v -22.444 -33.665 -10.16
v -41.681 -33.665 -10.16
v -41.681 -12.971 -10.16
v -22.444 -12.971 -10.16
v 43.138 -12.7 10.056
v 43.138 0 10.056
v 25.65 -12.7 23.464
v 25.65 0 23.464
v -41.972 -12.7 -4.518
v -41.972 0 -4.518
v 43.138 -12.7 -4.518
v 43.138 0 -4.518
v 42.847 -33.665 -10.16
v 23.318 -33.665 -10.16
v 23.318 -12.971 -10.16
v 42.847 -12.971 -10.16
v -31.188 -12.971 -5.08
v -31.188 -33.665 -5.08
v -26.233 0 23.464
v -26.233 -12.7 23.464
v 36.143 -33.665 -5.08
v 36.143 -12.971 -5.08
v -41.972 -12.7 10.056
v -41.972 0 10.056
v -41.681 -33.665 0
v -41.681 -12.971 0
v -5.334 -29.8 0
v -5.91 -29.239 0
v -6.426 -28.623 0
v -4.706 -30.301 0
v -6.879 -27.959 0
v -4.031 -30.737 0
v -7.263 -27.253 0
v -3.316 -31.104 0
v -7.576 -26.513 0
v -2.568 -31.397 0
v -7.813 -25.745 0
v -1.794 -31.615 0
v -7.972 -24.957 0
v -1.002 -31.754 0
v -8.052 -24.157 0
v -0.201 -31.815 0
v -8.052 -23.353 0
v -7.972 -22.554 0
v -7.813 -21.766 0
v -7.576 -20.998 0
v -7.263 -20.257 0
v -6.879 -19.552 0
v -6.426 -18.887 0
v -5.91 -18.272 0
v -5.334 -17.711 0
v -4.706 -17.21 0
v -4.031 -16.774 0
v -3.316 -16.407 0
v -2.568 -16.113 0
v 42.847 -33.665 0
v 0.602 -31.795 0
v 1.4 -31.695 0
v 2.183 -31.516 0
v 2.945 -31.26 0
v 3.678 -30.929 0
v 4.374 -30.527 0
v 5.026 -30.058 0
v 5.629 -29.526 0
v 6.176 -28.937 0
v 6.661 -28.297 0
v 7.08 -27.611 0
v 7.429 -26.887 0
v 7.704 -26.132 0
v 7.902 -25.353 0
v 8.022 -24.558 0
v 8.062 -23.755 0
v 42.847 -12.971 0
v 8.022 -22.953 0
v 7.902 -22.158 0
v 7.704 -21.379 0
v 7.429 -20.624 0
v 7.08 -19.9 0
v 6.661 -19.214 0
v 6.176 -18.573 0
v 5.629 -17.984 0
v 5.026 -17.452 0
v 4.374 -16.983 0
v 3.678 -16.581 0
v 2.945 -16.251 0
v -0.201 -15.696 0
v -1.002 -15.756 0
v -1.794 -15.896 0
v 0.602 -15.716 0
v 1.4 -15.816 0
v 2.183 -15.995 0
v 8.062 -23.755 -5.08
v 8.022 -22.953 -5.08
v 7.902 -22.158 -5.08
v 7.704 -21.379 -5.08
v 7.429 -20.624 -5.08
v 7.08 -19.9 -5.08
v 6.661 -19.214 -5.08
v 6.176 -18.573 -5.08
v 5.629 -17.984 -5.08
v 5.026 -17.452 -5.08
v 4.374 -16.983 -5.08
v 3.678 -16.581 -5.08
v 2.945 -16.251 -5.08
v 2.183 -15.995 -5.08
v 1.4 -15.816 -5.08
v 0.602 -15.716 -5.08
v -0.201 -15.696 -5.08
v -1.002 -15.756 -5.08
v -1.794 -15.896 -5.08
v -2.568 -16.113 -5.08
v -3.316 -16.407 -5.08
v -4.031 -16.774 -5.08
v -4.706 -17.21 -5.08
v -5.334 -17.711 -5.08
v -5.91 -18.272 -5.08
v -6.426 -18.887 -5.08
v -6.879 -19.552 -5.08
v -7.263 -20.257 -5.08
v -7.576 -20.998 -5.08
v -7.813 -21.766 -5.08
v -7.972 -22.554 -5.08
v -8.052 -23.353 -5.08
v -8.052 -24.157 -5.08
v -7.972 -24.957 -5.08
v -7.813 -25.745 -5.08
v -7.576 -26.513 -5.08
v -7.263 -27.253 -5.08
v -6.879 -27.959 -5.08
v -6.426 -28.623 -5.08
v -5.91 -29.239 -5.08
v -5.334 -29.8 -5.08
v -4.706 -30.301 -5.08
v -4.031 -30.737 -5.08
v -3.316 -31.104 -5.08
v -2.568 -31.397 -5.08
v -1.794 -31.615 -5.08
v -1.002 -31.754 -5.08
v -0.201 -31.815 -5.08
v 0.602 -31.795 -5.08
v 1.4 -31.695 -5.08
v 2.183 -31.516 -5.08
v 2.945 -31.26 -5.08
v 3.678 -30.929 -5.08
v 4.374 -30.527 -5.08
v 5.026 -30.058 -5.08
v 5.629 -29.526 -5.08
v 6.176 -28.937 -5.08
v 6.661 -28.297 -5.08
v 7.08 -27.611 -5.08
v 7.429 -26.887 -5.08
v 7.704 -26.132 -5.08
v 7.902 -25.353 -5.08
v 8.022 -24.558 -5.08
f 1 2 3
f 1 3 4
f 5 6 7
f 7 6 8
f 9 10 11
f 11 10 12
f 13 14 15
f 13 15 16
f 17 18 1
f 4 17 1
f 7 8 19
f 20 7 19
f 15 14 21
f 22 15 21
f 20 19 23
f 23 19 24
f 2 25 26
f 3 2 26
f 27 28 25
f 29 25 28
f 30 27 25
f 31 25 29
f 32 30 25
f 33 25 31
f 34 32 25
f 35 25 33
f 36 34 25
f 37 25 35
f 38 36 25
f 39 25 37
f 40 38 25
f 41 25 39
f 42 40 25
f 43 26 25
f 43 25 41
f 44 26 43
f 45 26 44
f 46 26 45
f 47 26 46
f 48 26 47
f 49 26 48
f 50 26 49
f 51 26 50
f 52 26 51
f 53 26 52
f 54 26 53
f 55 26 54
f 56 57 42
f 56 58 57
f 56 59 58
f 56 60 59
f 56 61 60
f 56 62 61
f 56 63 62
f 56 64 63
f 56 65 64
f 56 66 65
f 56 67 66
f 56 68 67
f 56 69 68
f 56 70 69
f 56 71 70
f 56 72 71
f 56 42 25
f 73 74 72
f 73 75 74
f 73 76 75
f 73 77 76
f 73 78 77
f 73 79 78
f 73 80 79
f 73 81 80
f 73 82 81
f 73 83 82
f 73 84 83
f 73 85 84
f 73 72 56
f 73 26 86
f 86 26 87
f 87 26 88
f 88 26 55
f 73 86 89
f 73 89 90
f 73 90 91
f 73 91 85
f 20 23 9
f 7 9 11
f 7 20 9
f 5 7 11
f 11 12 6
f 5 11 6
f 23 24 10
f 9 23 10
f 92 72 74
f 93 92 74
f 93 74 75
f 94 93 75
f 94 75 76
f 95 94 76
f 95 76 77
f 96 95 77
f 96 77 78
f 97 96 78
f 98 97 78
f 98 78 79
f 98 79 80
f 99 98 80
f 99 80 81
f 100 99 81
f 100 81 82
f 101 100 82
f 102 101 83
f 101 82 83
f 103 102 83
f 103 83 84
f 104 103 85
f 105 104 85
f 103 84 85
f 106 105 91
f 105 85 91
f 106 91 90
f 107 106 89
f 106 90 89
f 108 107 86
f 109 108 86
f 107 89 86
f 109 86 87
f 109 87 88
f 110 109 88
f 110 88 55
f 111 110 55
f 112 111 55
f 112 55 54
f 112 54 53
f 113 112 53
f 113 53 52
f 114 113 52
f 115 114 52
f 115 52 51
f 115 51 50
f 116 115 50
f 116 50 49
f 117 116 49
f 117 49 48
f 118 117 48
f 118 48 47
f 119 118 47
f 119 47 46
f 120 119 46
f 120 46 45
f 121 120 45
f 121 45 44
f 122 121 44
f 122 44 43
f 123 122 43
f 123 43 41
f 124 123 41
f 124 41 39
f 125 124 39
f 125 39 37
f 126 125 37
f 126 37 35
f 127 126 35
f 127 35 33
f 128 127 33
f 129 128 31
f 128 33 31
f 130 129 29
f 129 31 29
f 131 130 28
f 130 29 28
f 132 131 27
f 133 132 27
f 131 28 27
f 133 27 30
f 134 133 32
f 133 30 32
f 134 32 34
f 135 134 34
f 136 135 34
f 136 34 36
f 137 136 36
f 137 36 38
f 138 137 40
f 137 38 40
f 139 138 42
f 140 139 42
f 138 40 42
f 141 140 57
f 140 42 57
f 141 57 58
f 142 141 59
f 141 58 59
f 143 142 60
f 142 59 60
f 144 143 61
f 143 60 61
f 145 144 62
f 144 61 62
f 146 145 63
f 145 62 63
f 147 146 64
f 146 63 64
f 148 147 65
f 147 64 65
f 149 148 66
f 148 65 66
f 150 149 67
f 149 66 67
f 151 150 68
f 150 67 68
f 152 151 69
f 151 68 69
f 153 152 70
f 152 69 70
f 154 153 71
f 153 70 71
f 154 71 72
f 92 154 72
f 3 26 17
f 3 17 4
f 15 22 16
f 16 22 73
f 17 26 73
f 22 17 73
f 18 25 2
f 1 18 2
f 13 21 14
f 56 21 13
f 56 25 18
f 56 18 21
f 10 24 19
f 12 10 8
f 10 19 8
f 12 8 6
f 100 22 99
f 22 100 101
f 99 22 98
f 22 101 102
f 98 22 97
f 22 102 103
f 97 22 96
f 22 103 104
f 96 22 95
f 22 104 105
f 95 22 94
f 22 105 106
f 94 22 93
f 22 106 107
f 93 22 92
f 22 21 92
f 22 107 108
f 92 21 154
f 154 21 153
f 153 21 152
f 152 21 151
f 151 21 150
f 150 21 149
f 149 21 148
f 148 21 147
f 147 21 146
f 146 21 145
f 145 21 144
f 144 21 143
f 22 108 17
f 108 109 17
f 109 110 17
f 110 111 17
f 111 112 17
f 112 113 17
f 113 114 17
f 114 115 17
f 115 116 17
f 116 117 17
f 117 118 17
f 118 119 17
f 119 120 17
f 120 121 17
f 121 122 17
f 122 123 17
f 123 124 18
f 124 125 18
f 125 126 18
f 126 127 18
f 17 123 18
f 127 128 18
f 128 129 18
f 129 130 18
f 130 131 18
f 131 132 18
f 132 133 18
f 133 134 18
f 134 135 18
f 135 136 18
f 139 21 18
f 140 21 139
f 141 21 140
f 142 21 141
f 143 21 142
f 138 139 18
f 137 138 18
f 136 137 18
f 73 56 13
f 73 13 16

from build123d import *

# Parameters (mm, degrees)
F1_DEPTH = 12.7
F2_W     = 84.5278687775
F2_H     = 20.6947512925
F3_DEPTH = 10.16
F5_DEPTH = 76.2
F6_R     = 8.061811372
F7_DEPTH = 25.4


with BuildPart() as f1:
    # F0 (on Front) → F1 (new body)
    with BuildSketch(Plane.XZ):
        Polygon((25.6498344243, 23.4637726098), (-26.2327864766, 23.4637726098), (-41.9724583626, 10.0559014827), (-41.9724583626, -4.5178690925), (43.1383624673, -4.5178690925), (43.1383624673, 10.0559014827), align=None)
    extrude(amount=F1_DEPTH)


with BuildPart() as f3:
    # F2 (on Top) → F3 (new body)
    with BuildSketch(Plane.XY):
        with Locations((0.5829501897, -23.3180318028)):
            Rectangle(F2_W, F2_H)
    extrude(amount=-F3_DEPTH)

    # F4 (on face) → F5 (cut)
    with BuildSketch(Plane.XZ.offset(33.665407449)):
        Polygon((36.1429527402, -5.08), (-31.1878696084, -5.08), (-22.4436074495, -10.16), (23.3180318028, -10.16), align=None)
    extrude(amount=-F5_DEPTH, mode=Mode.SUBTRACT)

    # F6 (on face) → F7 (cut)
    with BuildSketch(Plane.XY):
        with Locations((0, -23.7552467734)):
            Circle(F6_R)
    extrude(amount=-F7_DEPTH, mode=Mode.SUBTRACT)


solid = Compound([f1.part, f3.part])
